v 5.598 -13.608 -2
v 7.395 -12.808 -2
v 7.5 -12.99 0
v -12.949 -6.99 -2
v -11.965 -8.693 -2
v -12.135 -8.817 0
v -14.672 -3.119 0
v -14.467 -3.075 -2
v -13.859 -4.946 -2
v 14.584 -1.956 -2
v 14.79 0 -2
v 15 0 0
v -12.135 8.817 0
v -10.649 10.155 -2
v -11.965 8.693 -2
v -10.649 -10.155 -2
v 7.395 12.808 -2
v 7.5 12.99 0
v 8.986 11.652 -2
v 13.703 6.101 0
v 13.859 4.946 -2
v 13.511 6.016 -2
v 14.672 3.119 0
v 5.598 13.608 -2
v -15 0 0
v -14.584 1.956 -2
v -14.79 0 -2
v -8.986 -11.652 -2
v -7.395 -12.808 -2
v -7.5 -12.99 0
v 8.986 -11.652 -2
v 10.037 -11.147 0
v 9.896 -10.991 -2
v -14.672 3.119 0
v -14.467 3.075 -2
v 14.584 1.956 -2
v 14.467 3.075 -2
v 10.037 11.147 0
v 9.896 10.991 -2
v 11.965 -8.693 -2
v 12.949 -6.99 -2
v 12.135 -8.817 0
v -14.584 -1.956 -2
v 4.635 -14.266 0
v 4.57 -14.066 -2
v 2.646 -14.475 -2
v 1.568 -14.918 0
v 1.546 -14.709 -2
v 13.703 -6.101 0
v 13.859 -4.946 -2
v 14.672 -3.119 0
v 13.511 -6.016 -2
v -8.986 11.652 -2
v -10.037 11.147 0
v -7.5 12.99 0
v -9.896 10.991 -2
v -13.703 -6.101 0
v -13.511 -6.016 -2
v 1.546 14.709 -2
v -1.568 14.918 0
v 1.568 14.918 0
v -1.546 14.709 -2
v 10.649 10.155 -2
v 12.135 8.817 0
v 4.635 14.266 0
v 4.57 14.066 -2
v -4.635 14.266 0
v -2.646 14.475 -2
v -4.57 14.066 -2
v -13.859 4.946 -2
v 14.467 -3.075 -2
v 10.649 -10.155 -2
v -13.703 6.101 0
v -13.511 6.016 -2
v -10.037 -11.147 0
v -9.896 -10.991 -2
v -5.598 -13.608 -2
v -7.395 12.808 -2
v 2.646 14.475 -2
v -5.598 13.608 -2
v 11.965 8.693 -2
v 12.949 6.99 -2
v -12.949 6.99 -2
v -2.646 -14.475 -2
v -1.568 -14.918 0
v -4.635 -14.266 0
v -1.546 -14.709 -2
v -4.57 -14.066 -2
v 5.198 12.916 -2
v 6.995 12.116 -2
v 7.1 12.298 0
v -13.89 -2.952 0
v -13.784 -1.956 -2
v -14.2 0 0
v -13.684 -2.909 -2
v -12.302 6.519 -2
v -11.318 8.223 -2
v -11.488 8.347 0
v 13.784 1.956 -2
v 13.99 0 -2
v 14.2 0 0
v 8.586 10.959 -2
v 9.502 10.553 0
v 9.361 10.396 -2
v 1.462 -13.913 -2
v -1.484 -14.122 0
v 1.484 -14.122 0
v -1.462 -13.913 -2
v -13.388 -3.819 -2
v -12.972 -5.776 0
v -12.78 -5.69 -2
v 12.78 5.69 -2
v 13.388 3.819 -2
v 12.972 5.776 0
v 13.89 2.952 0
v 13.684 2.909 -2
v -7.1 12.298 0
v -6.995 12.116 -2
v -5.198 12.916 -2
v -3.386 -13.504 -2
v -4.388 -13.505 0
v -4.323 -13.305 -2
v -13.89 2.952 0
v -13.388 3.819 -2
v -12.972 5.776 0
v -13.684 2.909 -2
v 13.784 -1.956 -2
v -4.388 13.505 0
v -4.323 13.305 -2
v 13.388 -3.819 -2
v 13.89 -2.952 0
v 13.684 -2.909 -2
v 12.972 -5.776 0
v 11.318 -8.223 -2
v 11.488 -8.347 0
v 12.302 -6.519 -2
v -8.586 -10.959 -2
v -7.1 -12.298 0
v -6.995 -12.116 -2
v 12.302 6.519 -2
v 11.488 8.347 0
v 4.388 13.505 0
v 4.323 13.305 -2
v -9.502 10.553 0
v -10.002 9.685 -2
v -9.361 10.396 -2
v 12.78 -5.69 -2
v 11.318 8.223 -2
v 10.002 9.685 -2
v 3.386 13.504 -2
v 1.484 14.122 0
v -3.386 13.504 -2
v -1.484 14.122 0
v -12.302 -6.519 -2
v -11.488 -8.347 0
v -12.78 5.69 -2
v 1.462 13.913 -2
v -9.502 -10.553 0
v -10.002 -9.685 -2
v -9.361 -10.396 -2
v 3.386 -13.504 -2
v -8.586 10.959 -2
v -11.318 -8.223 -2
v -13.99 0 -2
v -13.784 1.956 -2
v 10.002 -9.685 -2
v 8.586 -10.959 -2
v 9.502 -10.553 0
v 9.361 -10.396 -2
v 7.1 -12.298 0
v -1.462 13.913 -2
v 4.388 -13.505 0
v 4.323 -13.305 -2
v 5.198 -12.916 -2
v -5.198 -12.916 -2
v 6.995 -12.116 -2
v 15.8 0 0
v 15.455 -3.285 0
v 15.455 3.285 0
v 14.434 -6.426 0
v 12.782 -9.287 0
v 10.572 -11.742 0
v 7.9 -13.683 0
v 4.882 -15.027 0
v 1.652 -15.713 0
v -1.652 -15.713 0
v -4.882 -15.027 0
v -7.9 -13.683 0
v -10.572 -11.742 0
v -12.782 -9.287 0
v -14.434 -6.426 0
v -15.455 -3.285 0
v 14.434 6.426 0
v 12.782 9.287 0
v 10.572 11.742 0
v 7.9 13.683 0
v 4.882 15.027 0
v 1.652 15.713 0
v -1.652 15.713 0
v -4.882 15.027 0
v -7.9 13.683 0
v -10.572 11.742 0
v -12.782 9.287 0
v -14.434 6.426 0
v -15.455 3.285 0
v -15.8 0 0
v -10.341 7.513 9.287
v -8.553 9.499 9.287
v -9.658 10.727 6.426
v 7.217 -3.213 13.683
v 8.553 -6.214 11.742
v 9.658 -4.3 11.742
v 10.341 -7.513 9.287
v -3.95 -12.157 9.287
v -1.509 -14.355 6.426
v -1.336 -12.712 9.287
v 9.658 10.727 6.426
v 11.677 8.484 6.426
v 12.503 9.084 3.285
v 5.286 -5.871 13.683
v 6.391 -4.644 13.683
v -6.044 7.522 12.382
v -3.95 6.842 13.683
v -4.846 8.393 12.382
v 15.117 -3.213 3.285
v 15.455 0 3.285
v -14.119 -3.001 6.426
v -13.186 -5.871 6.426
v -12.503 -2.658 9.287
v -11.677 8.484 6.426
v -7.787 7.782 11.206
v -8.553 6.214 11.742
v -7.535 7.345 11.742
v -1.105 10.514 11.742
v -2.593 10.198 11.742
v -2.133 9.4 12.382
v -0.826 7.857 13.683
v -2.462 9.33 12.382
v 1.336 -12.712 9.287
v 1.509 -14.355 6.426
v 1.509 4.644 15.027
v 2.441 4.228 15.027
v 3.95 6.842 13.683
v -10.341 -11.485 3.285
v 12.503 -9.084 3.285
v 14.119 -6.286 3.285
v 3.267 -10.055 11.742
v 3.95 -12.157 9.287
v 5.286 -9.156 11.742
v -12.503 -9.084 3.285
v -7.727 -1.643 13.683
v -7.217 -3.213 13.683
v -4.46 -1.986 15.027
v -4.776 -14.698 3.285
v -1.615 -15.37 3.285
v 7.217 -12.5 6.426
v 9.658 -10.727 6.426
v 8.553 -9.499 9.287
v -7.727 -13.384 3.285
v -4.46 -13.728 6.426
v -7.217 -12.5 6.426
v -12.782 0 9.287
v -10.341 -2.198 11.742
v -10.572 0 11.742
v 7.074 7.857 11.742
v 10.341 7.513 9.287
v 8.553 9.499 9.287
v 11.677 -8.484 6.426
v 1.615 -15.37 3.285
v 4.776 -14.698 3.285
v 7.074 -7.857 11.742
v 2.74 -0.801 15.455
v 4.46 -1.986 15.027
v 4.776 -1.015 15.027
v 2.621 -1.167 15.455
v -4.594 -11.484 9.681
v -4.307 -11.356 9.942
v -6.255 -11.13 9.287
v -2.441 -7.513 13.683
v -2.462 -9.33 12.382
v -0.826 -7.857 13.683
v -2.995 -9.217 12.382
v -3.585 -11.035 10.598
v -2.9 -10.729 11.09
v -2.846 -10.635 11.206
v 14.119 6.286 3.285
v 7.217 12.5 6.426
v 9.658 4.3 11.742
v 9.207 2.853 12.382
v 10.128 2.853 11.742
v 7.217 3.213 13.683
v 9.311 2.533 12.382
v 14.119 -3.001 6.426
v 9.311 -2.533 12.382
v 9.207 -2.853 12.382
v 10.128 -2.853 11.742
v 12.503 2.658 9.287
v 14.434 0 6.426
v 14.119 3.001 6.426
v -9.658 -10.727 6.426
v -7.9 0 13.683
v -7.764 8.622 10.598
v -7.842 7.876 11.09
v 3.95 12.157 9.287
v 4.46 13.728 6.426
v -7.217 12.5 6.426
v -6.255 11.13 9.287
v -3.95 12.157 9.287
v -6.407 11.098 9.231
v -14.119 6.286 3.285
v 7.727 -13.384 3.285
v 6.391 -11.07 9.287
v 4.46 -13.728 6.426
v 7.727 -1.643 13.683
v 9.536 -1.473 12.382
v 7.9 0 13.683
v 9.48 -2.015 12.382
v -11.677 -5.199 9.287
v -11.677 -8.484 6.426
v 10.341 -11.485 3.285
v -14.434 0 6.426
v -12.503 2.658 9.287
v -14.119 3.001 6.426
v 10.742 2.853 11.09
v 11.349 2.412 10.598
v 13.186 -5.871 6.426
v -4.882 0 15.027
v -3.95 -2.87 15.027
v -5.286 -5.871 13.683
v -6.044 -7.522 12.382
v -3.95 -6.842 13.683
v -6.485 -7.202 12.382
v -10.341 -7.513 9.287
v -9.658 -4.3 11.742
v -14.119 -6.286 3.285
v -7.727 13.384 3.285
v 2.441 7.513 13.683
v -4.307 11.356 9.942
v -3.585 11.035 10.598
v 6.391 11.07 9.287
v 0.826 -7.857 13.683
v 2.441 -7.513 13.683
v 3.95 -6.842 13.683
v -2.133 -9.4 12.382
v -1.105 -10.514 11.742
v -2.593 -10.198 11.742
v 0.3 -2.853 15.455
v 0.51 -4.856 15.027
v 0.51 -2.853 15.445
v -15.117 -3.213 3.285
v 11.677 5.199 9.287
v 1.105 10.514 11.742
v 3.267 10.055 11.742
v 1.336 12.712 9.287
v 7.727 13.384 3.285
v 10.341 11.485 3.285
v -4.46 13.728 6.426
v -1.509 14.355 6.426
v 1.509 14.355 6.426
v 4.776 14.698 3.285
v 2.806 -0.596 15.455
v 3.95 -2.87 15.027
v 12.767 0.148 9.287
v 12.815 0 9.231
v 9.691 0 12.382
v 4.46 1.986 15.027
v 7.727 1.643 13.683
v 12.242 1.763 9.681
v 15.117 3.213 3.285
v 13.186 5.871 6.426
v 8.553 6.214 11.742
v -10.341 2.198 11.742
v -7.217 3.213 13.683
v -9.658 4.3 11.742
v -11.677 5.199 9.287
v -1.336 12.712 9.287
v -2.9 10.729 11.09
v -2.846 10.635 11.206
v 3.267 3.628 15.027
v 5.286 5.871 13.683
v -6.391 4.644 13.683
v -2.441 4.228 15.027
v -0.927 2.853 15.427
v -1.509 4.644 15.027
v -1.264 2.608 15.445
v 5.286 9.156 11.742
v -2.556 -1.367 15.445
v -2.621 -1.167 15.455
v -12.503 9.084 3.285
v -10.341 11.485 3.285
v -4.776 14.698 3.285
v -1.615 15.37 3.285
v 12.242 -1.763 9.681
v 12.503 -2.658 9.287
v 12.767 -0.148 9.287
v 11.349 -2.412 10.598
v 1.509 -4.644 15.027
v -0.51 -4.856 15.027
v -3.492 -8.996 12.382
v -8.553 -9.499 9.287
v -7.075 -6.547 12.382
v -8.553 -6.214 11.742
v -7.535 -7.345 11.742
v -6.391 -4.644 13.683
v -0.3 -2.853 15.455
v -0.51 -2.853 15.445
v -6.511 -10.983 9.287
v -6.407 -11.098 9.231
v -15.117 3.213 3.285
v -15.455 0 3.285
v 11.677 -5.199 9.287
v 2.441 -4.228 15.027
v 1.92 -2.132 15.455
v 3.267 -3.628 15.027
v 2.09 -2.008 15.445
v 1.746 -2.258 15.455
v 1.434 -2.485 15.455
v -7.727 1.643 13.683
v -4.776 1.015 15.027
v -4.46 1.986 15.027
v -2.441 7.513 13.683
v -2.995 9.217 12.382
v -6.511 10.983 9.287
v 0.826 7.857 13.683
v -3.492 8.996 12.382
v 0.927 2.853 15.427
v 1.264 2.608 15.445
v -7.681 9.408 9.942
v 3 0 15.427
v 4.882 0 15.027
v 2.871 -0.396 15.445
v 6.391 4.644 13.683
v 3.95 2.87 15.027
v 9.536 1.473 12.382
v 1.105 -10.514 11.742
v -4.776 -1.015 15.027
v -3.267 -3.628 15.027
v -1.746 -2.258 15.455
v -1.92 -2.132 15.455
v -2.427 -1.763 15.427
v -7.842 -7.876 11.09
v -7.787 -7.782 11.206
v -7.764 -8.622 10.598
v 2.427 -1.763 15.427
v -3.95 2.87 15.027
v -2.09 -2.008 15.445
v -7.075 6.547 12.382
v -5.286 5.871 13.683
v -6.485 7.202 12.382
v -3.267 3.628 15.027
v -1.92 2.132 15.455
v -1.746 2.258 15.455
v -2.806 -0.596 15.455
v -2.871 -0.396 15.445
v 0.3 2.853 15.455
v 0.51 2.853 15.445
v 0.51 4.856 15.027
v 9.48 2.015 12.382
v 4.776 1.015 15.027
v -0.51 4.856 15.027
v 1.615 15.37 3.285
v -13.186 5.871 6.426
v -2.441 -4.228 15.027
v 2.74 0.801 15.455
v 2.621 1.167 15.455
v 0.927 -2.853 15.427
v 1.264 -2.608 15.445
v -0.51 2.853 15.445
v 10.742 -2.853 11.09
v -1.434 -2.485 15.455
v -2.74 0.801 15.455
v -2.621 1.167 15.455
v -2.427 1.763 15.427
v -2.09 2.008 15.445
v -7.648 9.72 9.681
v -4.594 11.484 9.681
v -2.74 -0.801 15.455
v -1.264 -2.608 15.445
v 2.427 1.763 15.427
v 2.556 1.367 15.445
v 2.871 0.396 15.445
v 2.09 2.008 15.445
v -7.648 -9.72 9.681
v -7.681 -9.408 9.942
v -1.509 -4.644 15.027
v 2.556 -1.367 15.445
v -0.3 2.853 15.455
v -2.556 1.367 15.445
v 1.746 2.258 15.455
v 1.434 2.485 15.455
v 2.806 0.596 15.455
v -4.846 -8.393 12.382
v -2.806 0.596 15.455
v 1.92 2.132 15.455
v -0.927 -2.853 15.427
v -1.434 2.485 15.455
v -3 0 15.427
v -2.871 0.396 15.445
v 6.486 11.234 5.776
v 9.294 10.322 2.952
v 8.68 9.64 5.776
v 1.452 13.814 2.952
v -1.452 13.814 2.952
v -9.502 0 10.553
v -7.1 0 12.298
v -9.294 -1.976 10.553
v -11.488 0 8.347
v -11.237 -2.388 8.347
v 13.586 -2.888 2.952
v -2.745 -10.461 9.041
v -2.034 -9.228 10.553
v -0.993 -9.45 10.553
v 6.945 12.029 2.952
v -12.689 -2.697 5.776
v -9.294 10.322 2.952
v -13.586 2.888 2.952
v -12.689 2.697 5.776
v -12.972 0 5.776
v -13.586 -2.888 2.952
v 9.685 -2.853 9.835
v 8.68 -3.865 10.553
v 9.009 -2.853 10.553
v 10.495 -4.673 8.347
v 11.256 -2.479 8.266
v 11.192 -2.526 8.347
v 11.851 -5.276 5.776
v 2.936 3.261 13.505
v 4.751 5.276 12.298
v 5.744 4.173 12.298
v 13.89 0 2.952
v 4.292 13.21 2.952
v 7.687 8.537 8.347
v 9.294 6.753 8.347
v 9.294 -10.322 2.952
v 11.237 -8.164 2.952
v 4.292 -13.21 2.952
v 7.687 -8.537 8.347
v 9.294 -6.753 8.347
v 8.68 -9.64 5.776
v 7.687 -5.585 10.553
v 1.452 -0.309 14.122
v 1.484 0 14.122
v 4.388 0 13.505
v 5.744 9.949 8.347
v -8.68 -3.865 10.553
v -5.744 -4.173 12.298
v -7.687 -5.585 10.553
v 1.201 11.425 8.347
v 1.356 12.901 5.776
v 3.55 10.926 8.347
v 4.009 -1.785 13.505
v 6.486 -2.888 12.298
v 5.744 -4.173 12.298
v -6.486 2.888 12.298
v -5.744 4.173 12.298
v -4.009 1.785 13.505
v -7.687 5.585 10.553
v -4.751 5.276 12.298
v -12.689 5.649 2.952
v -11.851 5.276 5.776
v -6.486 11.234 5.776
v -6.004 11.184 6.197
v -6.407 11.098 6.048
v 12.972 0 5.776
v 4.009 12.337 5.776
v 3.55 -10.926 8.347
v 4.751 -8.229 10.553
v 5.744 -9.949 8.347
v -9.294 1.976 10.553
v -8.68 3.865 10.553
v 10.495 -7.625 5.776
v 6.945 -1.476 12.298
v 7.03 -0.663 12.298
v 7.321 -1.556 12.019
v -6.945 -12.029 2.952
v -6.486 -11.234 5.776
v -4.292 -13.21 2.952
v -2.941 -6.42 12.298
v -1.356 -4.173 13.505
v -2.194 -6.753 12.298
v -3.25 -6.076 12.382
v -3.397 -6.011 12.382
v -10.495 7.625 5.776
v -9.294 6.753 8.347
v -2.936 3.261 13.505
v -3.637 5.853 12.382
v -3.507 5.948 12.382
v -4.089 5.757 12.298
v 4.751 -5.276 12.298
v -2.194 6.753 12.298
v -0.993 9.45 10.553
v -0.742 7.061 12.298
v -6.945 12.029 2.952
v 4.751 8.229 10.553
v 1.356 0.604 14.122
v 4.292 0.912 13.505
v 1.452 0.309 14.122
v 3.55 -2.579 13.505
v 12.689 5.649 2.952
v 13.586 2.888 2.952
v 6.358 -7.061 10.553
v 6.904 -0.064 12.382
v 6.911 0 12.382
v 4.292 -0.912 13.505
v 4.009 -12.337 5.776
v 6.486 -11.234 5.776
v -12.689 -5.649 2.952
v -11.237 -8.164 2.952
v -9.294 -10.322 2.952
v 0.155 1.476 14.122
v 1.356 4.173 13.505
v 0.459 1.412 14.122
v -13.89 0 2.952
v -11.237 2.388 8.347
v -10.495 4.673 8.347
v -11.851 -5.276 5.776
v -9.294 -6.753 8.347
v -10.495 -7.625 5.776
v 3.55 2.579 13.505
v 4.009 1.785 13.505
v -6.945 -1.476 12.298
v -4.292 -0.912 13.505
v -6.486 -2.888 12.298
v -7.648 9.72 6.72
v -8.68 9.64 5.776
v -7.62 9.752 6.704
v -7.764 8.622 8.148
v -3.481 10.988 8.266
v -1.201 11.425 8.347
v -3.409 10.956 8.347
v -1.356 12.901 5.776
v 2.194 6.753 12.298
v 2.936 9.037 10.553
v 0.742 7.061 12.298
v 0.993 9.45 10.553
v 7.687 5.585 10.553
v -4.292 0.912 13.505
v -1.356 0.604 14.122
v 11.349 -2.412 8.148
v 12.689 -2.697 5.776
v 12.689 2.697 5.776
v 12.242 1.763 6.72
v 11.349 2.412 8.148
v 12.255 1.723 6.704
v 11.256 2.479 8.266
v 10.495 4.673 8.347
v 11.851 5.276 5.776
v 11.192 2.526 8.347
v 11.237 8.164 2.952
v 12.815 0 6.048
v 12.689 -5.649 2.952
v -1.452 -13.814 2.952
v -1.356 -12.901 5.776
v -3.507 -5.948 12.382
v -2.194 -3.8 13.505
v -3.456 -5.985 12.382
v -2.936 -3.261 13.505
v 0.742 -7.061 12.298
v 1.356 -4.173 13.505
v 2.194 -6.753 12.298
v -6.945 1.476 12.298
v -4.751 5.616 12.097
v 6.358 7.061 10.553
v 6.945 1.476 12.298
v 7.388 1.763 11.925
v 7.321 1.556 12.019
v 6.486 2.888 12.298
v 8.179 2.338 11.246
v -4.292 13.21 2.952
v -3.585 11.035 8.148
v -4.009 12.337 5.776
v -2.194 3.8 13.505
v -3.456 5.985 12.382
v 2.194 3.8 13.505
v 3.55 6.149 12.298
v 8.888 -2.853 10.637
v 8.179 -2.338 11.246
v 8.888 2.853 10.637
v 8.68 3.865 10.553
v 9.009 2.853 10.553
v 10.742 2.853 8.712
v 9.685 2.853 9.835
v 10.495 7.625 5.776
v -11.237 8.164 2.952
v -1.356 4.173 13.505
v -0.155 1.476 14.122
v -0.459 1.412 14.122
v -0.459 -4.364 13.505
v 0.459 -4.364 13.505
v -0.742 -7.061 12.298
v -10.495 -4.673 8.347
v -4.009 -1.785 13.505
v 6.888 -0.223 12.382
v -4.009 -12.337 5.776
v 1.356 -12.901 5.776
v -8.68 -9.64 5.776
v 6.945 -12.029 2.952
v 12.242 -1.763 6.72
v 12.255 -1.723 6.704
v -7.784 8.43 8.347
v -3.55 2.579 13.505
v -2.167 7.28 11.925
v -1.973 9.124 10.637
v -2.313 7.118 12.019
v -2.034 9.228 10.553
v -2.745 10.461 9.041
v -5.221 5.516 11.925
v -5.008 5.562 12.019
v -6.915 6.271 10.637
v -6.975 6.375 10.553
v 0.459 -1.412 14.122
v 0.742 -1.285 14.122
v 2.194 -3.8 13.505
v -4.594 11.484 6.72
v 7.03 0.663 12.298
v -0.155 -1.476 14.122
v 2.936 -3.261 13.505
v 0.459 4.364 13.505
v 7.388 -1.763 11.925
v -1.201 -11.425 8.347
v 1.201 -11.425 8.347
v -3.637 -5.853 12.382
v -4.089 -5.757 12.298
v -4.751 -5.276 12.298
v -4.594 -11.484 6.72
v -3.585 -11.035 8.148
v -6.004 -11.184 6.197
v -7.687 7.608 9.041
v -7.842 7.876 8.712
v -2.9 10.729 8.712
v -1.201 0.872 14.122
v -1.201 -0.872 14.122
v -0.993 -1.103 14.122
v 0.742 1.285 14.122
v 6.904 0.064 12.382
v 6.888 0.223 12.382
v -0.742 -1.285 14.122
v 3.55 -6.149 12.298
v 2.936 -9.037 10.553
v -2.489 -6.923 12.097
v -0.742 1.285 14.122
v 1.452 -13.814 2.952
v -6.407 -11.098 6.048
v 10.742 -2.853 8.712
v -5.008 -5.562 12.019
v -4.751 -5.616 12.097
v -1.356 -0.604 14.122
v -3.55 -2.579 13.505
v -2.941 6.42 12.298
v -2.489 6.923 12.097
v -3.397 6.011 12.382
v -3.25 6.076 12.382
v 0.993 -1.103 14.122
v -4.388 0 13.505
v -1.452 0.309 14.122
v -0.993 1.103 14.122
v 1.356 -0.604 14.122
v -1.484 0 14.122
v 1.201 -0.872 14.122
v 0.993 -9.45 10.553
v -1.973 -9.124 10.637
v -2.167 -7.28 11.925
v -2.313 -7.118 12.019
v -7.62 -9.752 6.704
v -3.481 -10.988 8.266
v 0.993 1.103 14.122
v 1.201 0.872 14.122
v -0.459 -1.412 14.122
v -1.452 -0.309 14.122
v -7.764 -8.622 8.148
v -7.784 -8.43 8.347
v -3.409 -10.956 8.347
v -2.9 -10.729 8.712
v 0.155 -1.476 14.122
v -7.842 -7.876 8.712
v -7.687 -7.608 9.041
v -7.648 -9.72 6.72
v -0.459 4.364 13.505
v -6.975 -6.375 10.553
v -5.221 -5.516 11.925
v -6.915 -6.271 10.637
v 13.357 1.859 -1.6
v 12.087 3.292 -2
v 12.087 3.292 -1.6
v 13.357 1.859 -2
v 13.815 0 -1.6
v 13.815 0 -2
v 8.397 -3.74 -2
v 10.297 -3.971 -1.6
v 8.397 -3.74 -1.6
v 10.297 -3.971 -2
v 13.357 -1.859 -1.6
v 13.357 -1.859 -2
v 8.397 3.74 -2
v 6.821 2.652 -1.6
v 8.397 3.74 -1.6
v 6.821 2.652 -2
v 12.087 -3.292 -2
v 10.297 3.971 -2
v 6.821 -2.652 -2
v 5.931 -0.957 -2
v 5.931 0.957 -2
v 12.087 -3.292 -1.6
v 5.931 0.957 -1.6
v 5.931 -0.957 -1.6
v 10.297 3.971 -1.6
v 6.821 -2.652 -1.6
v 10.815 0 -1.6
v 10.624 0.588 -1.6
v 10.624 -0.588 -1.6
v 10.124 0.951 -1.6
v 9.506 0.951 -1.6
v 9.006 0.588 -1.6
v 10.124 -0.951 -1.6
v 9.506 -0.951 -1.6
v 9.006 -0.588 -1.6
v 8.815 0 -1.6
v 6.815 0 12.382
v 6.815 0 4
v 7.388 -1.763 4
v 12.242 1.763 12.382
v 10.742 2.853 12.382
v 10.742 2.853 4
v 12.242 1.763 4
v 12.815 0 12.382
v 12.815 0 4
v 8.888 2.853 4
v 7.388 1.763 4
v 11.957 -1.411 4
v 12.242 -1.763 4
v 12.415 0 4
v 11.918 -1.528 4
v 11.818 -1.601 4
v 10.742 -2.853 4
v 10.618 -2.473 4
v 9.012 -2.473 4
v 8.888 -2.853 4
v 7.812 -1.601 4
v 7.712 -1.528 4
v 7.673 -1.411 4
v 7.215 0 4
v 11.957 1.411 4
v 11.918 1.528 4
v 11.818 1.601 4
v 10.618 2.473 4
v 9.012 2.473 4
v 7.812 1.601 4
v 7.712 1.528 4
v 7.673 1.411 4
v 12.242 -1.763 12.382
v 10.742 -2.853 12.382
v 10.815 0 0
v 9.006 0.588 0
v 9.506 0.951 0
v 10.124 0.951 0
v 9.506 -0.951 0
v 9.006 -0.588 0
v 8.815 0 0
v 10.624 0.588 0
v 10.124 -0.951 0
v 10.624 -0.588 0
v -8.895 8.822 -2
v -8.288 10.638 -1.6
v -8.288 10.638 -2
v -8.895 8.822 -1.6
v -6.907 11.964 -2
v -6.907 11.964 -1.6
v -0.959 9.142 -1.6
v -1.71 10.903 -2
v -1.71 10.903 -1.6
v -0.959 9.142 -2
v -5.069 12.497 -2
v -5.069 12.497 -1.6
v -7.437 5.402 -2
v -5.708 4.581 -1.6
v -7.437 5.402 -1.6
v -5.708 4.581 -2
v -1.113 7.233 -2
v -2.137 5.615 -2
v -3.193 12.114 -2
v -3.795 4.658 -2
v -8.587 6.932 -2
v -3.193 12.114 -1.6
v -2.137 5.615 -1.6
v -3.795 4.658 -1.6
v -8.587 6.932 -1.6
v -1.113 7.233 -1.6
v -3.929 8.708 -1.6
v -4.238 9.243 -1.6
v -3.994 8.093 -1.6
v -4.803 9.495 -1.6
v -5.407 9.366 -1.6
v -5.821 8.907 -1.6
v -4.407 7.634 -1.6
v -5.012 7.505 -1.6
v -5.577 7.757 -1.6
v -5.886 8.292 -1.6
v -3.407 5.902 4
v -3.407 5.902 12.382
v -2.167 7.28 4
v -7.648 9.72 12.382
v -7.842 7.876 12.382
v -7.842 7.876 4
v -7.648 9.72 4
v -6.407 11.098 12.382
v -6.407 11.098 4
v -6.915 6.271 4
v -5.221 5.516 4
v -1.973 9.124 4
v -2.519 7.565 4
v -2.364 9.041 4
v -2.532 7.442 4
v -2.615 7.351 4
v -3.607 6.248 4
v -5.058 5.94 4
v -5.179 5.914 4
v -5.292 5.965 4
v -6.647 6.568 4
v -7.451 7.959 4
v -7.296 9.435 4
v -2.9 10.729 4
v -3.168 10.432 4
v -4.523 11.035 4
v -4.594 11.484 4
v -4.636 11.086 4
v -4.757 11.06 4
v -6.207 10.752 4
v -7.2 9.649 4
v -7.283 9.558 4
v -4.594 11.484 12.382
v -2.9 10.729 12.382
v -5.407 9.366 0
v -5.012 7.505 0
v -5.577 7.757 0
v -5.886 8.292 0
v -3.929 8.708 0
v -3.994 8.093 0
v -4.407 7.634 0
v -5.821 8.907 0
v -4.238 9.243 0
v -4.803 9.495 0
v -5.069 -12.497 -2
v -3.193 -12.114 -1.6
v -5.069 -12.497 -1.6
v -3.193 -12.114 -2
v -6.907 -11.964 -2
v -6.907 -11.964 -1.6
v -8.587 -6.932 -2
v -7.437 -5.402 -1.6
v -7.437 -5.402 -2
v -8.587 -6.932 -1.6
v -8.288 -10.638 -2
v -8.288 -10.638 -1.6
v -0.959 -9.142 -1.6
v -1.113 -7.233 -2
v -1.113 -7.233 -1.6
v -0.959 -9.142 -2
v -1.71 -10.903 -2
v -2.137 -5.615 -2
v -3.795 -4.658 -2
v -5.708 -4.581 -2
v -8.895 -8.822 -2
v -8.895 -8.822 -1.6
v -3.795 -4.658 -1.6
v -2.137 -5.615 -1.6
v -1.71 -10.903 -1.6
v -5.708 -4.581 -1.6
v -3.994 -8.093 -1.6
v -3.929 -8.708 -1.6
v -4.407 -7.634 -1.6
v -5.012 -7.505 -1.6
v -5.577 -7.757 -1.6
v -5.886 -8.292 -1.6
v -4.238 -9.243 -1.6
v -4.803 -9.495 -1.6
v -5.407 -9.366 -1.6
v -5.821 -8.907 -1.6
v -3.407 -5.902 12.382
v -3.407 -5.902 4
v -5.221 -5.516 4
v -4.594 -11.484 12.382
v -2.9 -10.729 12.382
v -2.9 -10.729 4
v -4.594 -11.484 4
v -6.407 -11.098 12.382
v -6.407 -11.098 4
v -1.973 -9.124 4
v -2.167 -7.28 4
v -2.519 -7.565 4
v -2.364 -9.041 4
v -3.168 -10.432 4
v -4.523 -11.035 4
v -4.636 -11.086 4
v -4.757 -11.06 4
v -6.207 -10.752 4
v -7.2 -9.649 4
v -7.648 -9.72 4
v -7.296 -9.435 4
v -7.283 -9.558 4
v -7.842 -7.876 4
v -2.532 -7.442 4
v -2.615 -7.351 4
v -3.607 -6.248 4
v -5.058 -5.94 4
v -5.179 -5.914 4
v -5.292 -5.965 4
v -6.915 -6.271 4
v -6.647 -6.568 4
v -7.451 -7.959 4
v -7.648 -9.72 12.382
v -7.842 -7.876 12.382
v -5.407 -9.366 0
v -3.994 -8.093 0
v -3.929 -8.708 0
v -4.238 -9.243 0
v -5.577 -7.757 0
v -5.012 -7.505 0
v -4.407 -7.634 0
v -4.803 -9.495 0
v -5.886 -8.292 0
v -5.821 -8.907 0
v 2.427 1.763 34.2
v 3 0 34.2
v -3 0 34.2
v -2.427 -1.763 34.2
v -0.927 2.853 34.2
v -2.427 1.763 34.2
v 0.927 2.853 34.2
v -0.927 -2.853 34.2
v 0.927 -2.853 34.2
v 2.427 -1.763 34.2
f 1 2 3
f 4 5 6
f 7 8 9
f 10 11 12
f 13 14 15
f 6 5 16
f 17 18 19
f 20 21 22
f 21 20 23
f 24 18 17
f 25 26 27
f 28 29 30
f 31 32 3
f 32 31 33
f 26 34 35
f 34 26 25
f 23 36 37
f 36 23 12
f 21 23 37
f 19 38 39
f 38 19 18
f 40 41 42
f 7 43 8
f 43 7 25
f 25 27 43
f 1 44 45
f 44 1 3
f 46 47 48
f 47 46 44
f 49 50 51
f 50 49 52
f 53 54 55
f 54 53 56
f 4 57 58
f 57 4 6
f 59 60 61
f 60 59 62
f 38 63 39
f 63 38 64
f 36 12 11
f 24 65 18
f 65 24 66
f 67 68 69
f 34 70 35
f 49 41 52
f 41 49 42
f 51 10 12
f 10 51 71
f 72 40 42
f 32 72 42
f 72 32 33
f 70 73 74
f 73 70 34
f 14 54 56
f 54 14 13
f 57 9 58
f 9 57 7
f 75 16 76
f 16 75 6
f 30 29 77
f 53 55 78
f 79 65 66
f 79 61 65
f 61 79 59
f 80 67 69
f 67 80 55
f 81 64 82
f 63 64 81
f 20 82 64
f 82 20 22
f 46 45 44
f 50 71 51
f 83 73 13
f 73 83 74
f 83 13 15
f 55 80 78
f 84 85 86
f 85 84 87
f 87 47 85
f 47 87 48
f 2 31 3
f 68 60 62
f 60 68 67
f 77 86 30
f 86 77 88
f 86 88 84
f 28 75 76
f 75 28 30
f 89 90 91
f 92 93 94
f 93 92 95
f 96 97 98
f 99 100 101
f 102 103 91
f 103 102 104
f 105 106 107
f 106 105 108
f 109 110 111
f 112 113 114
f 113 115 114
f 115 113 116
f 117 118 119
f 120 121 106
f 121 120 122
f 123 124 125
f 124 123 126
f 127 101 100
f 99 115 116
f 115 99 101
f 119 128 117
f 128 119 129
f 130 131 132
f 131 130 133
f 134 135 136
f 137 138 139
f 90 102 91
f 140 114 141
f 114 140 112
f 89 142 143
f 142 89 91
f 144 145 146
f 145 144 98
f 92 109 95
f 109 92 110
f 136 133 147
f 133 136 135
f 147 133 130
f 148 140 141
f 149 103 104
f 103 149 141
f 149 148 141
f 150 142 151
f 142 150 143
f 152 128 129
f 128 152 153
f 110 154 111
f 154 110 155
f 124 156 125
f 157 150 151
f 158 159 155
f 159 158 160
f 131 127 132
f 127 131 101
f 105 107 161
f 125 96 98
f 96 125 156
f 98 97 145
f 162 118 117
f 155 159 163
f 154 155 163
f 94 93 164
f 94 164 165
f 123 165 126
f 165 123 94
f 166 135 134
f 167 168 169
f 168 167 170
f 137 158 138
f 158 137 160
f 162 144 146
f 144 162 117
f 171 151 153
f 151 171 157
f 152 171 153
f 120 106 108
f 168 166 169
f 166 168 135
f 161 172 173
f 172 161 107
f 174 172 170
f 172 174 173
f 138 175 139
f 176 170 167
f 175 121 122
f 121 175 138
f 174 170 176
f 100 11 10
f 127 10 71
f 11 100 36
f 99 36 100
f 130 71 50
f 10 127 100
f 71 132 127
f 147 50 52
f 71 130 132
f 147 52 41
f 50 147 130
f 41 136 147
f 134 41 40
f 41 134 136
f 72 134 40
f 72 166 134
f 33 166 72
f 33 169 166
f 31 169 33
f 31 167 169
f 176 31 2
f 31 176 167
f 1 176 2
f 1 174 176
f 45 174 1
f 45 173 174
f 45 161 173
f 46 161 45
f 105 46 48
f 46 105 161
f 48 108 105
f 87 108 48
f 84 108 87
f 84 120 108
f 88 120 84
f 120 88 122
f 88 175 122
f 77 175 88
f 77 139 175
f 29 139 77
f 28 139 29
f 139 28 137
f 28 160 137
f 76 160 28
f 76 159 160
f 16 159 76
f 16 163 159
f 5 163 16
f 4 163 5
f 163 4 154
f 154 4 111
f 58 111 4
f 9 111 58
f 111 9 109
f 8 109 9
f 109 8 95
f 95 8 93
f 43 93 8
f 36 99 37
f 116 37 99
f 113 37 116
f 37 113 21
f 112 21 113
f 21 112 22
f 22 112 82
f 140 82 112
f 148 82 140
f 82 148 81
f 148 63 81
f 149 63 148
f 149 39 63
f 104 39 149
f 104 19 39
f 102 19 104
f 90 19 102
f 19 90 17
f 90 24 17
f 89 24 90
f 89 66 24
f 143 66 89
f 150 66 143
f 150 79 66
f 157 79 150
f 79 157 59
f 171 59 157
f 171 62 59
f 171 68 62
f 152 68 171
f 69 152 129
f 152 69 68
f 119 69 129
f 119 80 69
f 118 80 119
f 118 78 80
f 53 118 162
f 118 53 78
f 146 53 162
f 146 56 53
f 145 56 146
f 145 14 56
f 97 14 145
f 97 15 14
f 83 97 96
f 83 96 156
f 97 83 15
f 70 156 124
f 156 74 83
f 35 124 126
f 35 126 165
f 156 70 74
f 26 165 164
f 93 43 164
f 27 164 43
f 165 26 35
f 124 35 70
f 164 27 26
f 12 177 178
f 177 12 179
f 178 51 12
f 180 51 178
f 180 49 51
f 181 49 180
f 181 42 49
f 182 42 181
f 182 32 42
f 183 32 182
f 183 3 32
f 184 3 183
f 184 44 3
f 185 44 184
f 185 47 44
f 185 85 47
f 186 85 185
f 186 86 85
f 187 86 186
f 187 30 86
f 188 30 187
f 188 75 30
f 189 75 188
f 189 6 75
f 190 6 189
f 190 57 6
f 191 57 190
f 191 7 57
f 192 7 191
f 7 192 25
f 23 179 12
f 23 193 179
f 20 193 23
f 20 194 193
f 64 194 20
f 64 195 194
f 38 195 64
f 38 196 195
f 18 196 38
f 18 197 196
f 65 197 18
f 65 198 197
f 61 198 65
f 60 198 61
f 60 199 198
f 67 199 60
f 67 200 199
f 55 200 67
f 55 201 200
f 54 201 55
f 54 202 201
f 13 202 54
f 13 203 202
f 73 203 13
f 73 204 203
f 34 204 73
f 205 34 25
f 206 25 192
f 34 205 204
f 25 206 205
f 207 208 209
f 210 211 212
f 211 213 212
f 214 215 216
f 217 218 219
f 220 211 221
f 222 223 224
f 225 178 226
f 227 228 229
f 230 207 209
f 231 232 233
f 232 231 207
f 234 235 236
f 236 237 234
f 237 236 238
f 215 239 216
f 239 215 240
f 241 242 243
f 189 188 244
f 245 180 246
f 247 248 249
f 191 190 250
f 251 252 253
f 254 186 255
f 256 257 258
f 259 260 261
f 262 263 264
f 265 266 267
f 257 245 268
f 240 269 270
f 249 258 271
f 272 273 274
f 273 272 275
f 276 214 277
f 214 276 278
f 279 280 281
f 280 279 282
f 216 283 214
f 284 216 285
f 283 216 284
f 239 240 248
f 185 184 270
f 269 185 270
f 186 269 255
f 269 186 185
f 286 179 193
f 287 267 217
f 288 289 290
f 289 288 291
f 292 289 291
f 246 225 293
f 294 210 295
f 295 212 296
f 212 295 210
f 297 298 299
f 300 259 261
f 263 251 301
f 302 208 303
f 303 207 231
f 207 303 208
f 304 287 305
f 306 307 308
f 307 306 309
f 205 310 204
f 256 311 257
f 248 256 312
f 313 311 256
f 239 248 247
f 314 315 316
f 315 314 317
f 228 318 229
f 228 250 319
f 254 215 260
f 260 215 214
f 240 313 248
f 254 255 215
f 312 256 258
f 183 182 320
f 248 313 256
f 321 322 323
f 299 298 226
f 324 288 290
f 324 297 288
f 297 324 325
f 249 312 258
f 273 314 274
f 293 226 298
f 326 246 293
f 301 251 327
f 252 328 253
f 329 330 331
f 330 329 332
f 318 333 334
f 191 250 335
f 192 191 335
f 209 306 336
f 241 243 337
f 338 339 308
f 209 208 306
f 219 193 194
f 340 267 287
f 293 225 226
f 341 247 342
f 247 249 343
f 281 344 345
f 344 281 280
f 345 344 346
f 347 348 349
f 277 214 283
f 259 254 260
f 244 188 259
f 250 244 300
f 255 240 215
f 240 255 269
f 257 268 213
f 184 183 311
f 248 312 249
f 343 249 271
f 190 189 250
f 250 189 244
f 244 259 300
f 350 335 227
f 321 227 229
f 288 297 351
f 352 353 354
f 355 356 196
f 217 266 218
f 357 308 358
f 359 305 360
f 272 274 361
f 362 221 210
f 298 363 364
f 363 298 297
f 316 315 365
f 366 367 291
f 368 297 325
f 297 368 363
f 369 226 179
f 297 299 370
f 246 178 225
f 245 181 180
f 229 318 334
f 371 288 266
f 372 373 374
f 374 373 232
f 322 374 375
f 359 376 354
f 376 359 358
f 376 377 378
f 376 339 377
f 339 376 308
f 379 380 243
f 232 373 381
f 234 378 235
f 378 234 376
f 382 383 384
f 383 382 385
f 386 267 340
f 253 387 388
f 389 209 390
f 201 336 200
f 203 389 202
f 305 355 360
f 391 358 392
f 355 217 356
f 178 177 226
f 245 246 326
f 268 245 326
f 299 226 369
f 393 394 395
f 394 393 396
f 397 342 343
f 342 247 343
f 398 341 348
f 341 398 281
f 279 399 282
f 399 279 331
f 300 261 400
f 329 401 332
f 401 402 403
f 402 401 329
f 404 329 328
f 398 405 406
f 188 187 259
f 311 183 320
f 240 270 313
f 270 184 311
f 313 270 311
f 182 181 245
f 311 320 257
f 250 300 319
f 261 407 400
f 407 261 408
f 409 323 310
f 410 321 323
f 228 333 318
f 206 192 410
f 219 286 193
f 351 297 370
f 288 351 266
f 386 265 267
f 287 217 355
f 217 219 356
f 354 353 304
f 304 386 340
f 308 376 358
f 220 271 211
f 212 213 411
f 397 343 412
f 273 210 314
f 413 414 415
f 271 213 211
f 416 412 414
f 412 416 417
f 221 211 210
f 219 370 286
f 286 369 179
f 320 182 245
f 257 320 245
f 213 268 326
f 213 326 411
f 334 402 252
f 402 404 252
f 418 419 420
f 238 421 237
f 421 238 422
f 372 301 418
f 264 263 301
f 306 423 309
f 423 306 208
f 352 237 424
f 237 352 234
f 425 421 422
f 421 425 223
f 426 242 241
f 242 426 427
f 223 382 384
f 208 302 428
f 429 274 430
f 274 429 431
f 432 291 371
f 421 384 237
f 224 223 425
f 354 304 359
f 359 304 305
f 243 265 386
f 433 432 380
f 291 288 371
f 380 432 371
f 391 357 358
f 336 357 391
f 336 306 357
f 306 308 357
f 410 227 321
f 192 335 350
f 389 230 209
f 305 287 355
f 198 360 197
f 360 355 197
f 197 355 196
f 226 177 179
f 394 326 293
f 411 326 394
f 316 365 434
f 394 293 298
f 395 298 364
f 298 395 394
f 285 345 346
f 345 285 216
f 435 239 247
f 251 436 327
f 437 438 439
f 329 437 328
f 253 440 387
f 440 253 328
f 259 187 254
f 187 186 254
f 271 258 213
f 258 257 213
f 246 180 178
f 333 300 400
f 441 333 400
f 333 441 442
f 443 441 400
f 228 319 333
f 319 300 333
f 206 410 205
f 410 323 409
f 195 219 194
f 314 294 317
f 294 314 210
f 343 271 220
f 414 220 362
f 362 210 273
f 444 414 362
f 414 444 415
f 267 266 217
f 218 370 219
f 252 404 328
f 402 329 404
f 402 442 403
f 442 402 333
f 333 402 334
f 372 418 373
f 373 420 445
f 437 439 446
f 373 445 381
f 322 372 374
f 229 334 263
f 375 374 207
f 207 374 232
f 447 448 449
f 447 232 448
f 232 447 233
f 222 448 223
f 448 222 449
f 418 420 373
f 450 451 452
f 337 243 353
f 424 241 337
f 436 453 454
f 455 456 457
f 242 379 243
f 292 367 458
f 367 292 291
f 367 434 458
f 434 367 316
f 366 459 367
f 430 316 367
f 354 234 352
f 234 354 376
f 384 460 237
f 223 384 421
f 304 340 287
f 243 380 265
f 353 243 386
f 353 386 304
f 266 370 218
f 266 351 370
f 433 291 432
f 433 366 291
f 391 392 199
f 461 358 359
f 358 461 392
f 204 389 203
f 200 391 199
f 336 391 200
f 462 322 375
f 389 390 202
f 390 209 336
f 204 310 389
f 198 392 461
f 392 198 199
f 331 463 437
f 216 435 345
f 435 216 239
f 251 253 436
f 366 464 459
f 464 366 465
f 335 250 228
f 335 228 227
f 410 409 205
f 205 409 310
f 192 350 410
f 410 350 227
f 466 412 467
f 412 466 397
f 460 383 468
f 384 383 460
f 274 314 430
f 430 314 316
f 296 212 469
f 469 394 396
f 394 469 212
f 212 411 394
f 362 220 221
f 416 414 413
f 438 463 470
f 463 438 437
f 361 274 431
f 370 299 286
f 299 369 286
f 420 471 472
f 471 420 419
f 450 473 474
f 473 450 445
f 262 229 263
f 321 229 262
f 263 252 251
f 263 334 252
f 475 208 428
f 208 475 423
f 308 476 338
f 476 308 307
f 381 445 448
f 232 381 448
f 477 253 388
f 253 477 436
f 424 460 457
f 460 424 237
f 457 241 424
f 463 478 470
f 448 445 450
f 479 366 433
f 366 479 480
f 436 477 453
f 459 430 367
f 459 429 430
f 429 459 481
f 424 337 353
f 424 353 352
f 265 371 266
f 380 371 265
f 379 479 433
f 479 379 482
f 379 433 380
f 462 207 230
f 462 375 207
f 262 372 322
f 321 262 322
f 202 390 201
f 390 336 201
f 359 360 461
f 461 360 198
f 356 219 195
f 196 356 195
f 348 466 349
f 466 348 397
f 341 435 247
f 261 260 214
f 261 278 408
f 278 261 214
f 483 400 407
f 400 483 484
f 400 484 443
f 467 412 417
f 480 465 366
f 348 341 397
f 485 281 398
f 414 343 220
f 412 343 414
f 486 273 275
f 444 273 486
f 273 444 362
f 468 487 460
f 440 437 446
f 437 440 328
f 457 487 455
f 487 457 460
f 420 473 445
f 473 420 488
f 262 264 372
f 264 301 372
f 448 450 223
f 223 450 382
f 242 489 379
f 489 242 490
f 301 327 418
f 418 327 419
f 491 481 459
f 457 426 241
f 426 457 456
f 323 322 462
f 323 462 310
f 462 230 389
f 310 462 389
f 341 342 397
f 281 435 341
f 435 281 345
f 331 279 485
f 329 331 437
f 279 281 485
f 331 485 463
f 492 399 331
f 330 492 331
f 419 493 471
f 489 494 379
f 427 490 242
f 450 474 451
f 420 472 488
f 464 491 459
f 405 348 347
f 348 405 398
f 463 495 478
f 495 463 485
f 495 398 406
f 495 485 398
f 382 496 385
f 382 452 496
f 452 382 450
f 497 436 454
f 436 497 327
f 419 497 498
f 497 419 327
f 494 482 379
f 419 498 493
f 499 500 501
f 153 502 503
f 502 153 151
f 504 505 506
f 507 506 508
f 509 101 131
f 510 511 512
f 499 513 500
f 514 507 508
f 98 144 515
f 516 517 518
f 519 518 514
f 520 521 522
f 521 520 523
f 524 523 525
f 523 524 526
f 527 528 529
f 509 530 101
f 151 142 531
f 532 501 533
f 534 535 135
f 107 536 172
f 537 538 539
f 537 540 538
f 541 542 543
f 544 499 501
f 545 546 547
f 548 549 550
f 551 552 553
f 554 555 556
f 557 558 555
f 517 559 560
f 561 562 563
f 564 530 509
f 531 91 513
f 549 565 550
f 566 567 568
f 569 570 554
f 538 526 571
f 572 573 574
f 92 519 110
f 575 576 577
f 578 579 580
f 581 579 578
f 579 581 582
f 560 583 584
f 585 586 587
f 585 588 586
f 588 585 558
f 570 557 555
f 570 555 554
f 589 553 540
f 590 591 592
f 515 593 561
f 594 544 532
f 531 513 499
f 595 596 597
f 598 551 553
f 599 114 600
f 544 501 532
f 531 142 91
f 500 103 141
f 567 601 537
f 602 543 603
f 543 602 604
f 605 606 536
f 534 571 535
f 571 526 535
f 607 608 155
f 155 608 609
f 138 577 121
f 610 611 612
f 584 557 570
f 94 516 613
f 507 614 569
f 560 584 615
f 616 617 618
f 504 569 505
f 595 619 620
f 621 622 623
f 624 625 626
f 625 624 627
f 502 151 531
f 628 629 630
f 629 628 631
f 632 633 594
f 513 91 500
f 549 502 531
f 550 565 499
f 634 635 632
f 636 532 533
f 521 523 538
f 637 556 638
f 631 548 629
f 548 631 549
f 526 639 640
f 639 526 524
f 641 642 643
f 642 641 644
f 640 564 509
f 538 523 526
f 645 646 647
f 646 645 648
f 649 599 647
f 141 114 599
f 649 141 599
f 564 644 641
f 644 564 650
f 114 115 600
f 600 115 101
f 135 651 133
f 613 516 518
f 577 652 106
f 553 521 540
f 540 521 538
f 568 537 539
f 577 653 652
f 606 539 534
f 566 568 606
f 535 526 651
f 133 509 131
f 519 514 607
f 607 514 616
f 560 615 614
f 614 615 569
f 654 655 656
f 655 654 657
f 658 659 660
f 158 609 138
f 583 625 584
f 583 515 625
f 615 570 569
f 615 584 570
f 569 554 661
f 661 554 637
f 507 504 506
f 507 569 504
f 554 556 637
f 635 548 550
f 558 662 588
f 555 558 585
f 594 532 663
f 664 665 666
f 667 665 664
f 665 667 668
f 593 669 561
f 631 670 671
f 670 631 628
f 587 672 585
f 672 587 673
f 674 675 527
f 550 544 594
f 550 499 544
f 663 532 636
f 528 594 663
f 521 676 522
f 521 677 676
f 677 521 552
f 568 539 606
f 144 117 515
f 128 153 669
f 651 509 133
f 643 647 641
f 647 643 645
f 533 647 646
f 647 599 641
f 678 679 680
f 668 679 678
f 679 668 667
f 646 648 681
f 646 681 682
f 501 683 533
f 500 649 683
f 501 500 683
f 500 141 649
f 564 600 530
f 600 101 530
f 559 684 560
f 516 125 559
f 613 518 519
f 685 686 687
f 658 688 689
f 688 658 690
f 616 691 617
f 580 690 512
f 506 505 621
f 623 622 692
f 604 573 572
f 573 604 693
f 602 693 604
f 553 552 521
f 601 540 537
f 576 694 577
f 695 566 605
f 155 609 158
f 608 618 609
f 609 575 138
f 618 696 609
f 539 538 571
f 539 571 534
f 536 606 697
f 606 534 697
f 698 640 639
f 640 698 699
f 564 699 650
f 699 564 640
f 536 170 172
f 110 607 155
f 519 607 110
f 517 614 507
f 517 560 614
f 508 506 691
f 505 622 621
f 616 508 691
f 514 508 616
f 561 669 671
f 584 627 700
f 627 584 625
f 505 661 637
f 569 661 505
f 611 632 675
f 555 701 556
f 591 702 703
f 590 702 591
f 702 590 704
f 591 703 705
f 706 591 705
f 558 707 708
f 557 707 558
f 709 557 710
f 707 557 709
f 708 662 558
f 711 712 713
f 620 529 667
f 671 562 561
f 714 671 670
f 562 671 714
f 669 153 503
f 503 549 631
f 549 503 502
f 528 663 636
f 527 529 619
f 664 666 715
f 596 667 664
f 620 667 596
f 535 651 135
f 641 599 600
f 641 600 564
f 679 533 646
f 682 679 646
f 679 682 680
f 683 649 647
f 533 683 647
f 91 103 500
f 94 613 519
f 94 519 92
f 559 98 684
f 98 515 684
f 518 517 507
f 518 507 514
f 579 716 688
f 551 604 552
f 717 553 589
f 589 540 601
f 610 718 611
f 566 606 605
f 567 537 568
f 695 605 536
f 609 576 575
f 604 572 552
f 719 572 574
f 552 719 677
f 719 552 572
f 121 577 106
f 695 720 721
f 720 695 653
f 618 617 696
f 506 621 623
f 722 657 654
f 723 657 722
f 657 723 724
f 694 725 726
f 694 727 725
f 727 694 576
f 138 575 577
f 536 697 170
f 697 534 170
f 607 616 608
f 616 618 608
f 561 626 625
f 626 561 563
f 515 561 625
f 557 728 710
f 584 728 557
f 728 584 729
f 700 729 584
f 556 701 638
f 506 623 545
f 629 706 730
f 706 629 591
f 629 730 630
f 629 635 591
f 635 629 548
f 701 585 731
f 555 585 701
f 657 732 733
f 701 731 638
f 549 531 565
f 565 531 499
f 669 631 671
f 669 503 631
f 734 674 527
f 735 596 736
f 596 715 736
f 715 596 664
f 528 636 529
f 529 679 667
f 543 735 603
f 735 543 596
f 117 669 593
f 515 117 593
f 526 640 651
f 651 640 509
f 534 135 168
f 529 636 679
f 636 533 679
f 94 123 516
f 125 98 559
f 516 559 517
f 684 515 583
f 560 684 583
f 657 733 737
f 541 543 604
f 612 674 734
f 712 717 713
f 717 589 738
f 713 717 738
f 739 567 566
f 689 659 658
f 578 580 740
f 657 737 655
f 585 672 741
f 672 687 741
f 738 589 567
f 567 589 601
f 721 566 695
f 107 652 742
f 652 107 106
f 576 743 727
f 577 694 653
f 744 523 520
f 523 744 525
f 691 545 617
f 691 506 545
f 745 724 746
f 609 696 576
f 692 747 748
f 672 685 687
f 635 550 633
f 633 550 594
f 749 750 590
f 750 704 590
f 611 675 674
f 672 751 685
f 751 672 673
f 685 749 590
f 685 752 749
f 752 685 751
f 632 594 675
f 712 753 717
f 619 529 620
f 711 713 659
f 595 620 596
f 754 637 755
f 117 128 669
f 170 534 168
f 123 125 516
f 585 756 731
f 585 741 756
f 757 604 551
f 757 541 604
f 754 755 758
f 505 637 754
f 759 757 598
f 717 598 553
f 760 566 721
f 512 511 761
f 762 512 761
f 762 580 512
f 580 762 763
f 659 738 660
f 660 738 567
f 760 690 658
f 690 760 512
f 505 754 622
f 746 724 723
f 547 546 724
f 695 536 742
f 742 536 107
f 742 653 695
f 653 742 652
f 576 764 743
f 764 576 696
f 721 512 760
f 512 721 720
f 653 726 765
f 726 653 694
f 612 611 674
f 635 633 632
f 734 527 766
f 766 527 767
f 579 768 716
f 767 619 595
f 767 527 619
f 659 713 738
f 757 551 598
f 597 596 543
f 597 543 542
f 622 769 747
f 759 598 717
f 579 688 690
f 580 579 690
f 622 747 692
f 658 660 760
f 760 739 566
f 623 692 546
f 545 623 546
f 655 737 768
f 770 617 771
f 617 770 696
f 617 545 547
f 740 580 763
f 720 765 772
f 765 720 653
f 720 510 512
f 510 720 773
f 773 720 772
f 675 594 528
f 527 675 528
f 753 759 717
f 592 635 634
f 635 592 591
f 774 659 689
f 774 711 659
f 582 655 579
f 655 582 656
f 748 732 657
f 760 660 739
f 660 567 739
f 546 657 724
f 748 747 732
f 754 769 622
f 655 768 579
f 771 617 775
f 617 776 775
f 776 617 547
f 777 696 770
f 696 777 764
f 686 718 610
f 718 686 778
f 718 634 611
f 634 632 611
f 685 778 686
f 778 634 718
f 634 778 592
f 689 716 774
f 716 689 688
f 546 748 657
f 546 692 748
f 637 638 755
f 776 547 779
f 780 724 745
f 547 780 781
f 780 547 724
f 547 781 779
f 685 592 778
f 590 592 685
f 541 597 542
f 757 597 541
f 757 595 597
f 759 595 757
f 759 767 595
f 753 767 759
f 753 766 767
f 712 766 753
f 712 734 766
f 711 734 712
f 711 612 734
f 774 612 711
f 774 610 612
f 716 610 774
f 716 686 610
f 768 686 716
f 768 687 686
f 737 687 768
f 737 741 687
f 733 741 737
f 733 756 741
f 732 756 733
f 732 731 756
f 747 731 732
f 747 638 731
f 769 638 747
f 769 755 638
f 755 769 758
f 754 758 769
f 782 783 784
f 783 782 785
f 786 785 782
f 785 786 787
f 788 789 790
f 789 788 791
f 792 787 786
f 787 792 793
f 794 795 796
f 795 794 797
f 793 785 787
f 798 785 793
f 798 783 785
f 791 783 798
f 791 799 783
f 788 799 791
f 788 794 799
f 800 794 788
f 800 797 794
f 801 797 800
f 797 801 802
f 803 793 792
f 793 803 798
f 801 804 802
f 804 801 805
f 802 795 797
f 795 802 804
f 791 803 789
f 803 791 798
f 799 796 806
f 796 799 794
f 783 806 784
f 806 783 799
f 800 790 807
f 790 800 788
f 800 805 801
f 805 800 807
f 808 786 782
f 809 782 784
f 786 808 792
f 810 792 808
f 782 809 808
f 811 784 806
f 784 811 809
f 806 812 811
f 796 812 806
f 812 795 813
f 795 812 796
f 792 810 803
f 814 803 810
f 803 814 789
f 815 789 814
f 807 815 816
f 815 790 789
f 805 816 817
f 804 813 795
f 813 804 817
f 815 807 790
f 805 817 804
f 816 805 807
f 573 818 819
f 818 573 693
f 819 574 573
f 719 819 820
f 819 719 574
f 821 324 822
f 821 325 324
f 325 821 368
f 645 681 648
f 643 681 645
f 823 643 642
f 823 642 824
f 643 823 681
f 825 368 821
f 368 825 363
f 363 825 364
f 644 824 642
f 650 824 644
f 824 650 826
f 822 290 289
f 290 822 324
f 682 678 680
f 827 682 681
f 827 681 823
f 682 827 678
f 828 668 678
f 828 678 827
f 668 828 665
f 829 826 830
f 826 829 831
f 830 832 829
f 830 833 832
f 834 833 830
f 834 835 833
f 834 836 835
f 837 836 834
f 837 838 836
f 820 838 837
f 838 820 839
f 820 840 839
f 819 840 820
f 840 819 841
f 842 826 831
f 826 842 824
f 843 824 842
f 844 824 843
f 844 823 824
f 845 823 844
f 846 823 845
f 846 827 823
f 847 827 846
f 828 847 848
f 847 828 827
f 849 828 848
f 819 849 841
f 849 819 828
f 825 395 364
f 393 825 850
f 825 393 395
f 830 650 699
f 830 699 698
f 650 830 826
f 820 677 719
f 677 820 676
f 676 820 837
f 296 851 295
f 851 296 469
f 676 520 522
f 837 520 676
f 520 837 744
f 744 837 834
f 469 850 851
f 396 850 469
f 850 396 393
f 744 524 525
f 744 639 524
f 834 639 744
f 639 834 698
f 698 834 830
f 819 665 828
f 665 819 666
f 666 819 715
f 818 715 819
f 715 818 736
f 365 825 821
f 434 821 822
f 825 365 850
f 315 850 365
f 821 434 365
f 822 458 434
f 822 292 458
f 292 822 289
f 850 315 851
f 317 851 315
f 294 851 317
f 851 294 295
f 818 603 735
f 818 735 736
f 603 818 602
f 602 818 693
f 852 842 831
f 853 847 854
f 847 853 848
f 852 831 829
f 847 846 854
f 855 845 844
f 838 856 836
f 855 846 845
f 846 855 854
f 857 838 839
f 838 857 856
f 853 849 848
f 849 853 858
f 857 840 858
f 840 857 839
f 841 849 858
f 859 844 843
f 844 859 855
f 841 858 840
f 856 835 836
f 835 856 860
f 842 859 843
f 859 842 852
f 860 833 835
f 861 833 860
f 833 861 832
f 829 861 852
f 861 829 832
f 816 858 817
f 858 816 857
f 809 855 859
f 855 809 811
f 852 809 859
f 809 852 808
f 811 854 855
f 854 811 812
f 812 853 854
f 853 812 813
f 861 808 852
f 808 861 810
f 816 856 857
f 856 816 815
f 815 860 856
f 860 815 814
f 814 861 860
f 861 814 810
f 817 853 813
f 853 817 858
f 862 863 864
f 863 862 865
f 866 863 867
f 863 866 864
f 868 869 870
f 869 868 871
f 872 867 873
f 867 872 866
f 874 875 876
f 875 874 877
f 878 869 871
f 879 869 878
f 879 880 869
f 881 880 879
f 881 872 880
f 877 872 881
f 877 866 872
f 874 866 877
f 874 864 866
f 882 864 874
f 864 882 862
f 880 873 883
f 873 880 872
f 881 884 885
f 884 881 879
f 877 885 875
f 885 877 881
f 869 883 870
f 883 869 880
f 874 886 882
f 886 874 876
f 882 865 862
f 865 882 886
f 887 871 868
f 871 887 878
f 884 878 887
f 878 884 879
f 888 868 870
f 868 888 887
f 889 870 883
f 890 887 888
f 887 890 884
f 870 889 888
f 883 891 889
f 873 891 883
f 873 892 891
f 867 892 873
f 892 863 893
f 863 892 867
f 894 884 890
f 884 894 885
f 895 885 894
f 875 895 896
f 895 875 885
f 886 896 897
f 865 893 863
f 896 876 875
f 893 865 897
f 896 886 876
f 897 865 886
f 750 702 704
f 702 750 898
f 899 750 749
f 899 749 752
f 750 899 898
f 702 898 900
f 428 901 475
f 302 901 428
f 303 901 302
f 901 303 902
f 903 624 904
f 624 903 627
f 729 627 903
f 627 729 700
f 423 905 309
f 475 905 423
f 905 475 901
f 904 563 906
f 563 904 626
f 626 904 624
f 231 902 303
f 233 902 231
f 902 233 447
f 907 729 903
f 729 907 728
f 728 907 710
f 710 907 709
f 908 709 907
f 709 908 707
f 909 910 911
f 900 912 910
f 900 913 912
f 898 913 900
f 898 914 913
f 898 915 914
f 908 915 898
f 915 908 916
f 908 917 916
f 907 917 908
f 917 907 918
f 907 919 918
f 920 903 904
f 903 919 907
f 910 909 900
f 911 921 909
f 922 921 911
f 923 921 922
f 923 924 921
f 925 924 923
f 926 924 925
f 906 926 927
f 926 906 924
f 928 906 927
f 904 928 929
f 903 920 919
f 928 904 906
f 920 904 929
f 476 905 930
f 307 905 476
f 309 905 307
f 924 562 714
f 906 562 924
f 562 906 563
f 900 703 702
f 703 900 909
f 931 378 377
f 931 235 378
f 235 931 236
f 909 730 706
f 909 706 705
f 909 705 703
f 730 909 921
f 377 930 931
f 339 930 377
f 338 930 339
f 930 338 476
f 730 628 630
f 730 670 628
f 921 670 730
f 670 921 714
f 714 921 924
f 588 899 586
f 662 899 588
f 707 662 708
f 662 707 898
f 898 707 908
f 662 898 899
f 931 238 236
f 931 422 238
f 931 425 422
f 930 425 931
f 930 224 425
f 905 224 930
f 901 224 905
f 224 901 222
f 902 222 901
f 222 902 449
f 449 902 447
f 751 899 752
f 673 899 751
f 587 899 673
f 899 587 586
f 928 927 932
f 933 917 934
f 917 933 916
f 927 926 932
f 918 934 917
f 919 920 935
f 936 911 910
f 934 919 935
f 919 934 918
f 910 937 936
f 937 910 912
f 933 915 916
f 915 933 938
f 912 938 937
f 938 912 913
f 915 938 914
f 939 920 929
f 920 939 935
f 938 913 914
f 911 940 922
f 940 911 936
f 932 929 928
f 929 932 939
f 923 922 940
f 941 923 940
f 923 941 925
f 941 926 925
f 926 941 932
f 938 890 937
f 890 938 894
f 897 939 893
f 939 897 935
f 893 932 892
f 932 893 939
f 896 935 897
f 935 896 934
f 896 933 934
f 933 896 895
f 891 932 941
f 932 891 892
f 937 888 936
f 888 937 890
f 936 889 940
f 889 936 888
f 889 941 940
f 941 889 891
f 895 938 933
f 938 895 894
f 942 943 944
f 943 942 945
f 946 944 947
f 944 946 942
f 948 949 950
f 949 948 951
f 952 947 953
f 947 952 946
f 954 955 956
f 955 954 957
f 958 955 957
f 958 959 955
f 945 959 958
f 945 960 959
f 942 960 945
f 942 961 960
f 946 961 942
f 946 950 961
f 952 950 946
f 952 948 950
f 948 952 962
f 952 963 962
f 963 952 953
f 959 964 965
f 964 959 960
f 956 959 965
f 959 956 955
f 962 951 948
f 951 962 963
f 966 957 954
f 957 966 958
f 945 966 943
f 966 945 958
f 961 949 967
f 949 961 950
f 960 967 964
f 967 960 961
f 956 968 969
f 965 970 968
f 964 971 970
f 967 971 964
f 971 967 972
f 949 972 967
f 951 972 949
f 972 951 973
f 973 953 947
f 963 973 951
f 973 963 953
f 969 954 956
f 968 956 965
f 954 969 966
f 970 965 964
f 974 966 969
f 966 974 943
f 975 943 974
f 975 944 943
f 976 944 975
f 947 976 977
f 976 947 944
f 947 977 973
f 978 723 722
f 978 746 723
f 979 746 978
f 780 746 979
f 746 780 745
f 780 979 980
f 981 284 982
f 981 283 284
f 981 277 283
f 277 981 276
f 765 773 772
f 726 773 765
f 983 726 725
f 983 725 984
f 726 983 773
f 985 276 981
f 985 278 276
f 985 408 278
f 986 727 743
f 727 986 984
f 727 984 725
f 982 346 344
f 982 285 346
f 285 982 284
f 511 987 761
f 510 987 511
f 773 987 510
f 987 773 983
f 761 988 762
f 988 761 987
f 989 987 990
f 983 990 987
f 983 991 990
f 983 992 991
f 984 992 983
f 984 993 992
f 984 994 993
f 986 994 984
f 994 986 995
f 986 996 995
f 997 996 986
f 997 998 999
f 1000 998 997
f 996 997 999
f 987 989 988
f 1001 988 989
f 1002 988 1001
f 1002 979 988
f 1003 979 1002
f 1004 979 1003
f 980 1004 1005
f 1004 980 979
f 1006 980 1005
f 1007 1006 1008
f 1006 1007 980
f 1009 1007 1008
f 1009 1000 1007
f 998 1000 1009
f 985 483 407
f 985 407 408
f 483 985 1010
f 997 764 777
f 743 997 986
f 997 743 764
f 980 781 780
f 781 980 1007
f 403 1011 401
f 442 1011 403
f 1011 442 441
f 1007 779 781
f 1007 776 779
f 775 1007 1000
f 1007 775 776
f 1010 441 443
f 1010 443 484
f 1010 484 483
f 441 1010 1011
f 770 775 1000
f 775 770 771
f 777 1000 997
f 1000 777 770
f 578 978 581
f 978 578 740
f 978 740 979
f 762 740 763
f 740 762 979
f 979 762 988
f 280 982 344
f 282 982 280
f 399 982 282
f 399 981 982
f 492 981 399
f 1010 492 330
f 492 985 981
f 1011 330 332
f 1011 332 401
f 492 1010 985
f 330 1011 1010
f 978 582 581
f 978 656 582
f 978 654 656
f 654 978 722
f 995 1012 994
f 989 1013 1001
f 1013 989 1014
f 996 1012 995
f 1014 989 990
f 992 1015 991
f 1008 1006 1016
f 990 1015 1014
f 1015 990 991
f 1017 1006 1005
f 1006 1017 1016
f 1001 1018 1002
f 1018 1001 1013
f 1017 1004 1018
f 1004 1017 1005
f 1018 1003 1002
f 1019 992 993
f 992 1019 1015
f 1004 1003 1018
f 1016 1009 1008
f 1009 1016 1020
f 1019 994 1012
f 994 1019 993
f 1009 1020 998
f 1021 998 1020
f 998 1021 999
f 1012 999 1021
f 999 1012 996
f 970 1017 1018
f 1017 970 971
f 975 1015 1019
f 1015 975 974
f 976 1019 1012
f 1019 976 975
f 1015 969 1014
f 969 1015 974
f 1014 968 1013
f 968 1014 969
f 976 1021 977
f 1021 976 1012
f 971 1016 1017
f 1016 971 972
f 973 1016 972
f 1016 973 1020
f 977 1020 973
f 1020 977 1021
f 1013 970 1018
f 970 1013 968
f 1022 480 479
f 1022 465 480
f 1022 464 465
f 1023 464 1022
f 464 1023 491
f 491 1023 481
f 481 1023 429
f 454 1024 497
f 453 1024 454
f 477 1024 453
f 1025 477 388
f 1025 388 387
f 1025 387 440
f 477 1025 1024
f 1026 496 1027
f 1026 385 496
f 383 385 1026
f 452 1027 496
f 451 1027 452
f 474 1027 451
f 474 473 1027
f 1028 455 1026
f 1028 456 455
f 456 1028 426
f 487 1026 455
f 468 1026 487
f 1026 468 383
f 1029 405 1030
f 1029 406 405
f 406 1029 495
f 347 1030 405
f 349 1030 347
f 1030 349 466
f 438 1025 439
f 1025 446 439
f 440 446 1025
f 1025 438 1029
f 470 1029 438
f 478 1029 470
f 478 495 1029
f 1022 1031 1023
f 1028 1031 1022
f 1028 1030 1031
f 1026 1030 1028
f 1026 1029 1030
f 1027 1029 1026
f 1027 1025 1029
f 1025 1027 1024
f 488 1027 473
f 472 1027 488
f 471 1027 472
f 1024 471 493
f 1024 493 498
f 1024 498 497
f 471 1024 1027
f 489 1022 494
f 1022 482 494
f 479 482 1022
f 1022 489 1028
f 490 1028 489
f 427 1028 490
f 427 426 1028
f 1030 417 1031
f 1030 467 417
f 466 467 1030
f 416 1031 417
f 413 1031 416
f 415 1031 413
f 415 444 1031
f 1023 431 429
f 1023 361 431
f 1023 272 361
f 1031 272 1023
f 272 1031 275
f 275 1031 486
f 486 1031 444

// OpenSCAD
// [FL_INDEX: keywords="openscad, 3d_parametric, circular_PCB_holder_for_drill, csg_solid" | COT="Parametric OpenSCAD design from 3DCodeverse"]
// Title: circular PCB holder for drill

// Licence: Creative Commons, Attribution, Non-commercial
// Created: 15-02-2013 by bmcage http://www.thingiverse.com/bmcage

// radius of the printplate
radpp = 15;
// radius of the holes in printplate                
radholepp = 1;
// thickness of the shell, take eg 2x your nozzle diam. This is thickness of the lip, sphere will have twice this thickness!        
thickshell = 0.8;
radius = radpp + thickshell;
// holes in PCB are on an equilateral triangle. Give side in mm
sidetria = 17;            
radtriacircum = sidetria/sqrt(3);

//there are two possible parts
part = "base";           // [base, top_1] 

//height of the lip that is used to click both parts together
lipheight = 2;

//add a drillholder pin on the base or not/
drill_holder = "yes";    // [yes, no]
//height of the drillholder
drill_height = 20;
//diameter of the drill bit
drill_size = 6; 

use <MCAD/regular_shapes.scad> 

module lip()
{
intersection()
  {
   translate([-1.5*radius, -1.5 *radius, 0])
           cube(size=[radius * 3, radius * 3, lipheight]);
   difference(){sphere(radius-thickshell); sphere(radius-2*thickshell);}
   }
}

module pin()
{union(){
  translate([radtriacircum,0,lipheight-0.4])cylinder(r1=4, r2=4, h=0.4);
  translate([radtriacircum, 0 , -sqrt(radius*radius-radtriacircum*radtriacircum)])
    cylinder(r1=3*radholepp, r2=3*radholepp, h=sqrt(radius*radius-radtriacircum*radtriacircum)+lipheight-2-4, $fn=10);
  translate([radtriacircum, 0 , -5])
    cylinder(r1=3*radholepp, r2=radholepp, h=5, $fn=10);
  translate([radtriacircum, 0 , -1])
    cylinder(r1=radholepp, r2=radholepp, h=lipheight+1, $fn=10);
  }
}

module holder()
{
union()
  {
  lip();
  intersection()
    {
    translate([-1.5*radius, -1.5 *radius, -2*radius])
              cube(size=[radius * 3, radius * 3, 2*radius]);
	 difference(){sphere(radius); sphere(radius-2*thickshell);}
    }
  pin();
  rotate([0,0,120]) pin();
  rotate([0,0,-120]) pin();
  if (drill_holder == "yes") {
    translate([0,0,-radius+2*thickshell]) mirror([0,0,-1]) cylinder(r=drill_size/2, h=drill_height, $fn=10);
    }
  }
}

module holderheadbase()
{
    intersection() 
    {
    translate([-1.5*radius, -1.5 *radius, 0])
      cube(size=[radius * 3, radius * 3, 2*radius]);
	 difference(){sphere(radius); sphere(radius-thickshell);}
    }
}

module holderhead()
{
  difference()
  {holderheadbase();
   linear_extrude(height=2*radius) hexagon(2);
   rotate([45,0,0])cylinder(r=2, h=2*radius, $fn=10);
   rotate([45,0,60])cylinder(r=2, h=2*radius, $fn=10);
   rotate([45,0,120])cylinder(r=2, h=2*radius, $fn=10);
   rotate([45,0,180])cylinder(r=2, h=2*radius, $fn=10);
   rotate([45,0,240])cylinder(r=2, h=2*radius, $fn=10);
   rotate([45,0,300])cylinder(r=2, h=2*radius, $fn=10);
  }
}

if (part=="base")
{
  mirror([0,0,1])holder();
} 
if (part == "top_1")
{
  holderhead();
}
